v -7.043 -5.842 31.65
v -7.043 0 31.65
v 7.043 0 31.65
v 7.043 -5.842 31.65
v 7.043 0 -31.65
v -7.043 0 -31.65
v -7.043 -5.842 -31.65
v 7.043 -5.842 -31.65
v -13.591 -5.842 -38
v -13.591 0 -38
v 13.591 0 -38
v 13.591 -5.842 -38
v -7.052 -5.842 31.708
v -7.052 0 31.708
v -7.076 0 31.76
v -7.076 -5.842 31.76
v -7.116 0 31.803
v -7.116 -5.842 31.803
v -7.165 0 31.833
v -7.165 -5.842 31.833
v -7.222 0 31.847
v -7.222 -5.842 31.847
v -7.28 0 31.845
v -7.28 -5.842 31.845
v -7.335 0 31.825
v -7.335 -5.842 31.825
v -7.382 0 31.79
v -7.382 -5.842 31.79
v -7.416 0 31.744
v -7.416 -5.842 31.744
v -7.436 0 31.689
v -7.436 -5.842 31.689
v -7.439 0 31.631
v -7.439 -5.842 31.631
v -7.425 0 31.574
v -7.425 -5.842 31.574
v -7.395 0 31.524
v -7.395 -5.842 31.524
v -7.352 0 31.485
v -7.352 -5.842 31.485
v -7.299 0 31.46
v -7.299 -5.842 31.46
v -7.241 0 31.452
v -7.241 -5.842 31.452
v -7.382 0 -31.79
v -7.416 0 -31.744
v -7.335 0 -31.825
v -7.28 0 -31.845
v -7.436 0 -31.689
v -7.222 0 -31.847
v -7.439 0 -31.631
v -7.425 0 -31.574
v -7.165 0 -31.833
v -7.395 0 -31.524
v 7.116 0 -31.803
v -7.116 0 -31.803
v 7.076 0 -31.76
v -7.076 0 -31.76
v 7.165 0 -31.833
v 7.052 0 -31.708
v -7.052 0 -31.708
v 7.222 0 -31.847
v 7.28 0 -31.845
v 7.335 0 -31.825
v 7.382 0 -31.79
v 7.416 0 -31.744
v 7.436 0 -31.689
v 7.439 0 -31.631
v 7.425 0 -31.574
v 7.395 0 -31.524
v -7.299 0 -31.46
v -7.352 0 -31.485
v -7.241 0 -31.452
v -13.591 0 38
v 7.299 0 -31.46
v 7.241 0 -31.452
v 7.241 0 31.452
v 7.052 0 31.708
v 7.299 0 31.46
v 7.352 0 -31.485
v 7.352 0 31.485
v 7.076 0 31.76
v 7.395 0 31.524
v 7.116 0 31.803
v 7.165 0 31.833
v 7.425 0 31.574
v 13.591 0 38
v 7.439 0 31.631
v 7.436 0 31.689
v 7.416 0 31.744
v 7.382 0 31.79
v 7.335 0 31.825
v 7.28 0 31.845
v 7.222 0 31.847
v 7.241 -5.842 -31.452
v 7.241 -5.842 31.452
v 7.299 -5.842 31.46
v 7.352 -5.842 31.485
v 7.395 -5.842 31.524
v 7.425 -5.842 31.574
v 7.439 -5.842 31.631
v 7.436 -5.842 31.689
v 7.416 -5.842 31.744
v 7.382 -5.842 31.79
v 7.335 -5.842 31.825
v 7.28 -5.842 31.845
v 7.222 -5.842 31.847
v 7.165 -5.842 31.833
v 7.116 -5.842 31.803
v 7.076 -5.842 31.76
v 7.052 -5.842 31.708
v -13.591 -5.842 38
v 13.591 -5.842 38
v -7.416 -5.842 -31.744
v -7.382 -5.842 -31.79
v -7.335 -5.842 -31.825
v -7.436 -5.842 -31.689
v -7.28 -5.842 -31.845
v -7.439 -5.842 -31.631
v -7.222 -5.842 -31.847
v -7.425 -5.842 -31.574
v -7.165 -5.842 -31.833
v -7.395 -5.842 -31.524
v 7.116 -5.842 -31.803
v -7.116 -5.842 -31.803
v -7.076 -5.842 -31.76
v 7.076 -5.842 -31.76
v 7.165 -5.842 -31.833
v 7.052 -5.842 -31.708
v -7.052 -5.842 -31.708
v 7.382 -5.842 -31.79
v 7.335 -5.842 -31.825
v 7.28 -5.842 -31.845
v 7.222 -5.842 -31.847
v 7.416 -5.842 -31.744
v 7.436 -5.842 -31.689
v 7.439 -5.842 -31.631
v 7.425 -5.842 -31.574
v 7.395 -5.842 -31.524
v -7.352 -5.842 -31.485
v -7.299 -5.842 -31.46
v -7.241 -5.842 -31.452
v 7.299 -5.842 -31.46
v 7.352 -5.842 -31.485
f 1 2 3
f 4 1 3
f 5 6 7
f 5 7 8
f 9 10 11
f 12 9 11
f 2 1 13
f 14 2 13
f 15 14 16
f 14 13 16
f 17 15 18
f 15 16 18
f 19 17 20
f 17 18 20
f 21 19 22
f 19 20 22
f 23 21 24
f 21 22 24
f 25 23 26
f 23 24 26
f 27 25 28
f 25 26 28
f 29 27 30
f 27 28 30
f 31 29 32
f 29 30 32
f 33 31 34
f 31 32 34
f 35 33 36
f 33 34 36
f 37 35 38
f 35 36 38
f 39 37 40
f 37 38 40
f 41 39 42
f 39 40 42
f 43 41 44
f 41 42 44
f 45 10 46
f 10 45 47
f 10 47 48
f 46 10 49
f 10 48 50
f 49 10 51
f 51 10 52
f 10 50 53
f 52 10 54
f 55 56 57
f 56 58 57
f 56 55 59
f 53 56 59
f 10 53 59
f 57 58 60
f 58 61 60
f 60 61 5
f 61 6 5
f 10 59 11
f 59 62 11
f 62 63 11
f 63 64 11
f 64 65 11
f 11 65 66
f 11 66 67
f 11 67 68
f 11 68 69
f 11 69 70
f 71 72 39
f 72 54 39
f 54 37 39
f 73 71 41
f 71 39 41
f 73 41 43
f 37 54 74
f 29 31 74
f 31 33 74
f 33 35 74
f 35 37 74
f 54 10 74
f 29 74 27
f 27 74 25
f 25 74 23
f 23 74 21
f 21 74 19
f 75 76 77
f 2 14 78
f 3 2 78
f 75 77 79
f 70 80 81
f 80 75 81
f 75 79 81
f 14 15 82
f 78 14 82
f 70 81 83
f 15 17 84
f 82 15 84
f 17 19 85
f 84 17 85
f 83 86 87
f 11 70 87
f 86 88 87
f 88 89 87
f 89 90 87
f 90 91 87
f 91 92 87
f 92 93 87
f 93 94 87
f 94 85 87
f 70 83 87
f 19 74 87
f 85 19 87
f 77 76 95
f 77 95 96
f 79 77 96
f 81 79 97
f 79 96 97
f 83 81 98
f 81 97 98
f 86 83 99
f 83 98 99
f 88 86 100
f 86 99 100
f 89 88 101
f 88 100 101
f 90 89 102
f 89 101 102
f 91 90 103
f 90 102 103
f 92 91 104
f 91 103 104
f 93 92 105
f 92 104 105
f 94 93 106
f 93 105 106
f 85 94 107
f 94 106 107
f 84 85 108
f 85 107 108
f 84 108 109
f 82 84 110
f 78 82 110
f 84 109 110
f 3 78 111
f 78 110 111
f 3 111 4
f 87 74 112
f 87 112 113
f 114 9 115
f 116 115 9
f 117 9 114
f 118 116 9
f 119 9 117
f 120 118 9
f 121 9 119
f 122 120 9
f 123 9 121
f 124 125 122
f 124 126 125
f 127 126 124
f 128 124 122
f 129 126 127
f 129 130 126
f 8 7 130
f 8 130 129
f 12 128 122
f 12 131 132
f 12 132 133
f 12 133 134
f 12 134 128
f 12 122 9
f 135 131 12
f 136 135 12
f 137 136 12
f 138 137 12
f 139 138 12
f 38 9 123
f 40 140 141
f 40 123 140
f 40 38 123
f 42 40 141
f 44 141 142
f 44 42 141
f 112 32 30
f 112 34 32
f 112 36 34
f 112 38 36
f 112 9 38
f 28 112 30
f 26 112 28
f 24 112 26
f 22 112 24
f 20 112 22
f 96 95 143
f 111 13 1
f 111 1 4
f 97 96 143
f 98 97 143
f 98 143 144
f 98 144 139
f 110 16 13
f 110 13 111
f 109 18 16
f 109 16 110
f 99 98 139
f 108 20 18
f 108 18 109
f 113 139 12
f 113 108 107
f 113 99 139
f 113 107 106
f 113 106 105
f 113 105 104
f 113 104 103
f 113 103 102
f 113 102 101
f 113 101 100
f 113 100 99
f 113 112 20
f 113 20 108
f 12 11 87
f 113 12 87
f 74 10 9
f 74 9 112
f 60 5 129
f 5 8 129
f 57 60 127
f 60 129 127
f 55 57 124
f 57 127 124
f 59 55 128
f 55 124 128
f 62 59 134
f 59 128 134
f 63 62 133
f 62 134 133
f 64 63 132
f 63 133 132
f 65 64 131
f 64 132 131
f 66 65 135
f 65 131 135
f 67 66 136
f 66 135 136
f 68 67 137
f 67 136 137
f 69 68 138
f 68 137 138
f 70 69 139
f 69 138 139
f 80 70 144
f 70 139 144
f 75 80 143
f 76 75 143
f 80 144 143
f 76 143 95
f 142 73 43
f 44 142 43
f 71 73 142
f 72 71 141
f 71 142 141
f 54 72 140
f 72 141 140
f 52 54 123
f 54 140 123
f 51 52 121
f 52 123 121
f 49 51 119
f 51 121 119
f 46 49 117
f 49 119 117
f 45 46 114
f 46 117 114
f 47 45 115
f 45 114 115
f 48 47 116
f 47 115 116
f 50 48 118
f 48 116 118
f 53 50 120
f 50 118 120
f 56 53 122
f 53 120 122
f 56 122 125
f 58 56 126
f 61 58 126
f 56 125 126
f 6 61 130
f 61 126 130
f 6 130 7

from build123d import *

# Parameters (mm, degrees)
F0_W     = 27.1828
F0_H     = 76
F0_W_2   = 14.4828
F0_H_2   = 63.3
F1_DEPTH = 5.842
F2_R     = 0.198438
F3_DEPTH = 5.843


with BuildPart() as f1:
    # F0 (on Front) → F1 (new body)
    with BuildSketch(Plane.XZ):
        Rectangle(F0_W, F0_H)
        Rectangle(F0_W_2, F0_H_2, mode=Mode.SUBTRACT)
    extrude(amount=F1_DEPTH)

    # F2 (on face) → F3 (cut, through all)
    with BuildSketch(Plane.XZ.offset(5.842)):
        with Locations((-7.2414, 31.65)):
            Circle(F2_R)
        with Locations((7.2414, 31.65)):
            Circle(F2_R)
        with Locations((-7.2414, -31.65)):
            Circle(F2_R)
        with Locations((7.2414, -31.65)):
            Circle(F2_R)
    extrude(amount=-F3_DEPTH, mode=Mode.SUBTRACT)


solid = f1.part
